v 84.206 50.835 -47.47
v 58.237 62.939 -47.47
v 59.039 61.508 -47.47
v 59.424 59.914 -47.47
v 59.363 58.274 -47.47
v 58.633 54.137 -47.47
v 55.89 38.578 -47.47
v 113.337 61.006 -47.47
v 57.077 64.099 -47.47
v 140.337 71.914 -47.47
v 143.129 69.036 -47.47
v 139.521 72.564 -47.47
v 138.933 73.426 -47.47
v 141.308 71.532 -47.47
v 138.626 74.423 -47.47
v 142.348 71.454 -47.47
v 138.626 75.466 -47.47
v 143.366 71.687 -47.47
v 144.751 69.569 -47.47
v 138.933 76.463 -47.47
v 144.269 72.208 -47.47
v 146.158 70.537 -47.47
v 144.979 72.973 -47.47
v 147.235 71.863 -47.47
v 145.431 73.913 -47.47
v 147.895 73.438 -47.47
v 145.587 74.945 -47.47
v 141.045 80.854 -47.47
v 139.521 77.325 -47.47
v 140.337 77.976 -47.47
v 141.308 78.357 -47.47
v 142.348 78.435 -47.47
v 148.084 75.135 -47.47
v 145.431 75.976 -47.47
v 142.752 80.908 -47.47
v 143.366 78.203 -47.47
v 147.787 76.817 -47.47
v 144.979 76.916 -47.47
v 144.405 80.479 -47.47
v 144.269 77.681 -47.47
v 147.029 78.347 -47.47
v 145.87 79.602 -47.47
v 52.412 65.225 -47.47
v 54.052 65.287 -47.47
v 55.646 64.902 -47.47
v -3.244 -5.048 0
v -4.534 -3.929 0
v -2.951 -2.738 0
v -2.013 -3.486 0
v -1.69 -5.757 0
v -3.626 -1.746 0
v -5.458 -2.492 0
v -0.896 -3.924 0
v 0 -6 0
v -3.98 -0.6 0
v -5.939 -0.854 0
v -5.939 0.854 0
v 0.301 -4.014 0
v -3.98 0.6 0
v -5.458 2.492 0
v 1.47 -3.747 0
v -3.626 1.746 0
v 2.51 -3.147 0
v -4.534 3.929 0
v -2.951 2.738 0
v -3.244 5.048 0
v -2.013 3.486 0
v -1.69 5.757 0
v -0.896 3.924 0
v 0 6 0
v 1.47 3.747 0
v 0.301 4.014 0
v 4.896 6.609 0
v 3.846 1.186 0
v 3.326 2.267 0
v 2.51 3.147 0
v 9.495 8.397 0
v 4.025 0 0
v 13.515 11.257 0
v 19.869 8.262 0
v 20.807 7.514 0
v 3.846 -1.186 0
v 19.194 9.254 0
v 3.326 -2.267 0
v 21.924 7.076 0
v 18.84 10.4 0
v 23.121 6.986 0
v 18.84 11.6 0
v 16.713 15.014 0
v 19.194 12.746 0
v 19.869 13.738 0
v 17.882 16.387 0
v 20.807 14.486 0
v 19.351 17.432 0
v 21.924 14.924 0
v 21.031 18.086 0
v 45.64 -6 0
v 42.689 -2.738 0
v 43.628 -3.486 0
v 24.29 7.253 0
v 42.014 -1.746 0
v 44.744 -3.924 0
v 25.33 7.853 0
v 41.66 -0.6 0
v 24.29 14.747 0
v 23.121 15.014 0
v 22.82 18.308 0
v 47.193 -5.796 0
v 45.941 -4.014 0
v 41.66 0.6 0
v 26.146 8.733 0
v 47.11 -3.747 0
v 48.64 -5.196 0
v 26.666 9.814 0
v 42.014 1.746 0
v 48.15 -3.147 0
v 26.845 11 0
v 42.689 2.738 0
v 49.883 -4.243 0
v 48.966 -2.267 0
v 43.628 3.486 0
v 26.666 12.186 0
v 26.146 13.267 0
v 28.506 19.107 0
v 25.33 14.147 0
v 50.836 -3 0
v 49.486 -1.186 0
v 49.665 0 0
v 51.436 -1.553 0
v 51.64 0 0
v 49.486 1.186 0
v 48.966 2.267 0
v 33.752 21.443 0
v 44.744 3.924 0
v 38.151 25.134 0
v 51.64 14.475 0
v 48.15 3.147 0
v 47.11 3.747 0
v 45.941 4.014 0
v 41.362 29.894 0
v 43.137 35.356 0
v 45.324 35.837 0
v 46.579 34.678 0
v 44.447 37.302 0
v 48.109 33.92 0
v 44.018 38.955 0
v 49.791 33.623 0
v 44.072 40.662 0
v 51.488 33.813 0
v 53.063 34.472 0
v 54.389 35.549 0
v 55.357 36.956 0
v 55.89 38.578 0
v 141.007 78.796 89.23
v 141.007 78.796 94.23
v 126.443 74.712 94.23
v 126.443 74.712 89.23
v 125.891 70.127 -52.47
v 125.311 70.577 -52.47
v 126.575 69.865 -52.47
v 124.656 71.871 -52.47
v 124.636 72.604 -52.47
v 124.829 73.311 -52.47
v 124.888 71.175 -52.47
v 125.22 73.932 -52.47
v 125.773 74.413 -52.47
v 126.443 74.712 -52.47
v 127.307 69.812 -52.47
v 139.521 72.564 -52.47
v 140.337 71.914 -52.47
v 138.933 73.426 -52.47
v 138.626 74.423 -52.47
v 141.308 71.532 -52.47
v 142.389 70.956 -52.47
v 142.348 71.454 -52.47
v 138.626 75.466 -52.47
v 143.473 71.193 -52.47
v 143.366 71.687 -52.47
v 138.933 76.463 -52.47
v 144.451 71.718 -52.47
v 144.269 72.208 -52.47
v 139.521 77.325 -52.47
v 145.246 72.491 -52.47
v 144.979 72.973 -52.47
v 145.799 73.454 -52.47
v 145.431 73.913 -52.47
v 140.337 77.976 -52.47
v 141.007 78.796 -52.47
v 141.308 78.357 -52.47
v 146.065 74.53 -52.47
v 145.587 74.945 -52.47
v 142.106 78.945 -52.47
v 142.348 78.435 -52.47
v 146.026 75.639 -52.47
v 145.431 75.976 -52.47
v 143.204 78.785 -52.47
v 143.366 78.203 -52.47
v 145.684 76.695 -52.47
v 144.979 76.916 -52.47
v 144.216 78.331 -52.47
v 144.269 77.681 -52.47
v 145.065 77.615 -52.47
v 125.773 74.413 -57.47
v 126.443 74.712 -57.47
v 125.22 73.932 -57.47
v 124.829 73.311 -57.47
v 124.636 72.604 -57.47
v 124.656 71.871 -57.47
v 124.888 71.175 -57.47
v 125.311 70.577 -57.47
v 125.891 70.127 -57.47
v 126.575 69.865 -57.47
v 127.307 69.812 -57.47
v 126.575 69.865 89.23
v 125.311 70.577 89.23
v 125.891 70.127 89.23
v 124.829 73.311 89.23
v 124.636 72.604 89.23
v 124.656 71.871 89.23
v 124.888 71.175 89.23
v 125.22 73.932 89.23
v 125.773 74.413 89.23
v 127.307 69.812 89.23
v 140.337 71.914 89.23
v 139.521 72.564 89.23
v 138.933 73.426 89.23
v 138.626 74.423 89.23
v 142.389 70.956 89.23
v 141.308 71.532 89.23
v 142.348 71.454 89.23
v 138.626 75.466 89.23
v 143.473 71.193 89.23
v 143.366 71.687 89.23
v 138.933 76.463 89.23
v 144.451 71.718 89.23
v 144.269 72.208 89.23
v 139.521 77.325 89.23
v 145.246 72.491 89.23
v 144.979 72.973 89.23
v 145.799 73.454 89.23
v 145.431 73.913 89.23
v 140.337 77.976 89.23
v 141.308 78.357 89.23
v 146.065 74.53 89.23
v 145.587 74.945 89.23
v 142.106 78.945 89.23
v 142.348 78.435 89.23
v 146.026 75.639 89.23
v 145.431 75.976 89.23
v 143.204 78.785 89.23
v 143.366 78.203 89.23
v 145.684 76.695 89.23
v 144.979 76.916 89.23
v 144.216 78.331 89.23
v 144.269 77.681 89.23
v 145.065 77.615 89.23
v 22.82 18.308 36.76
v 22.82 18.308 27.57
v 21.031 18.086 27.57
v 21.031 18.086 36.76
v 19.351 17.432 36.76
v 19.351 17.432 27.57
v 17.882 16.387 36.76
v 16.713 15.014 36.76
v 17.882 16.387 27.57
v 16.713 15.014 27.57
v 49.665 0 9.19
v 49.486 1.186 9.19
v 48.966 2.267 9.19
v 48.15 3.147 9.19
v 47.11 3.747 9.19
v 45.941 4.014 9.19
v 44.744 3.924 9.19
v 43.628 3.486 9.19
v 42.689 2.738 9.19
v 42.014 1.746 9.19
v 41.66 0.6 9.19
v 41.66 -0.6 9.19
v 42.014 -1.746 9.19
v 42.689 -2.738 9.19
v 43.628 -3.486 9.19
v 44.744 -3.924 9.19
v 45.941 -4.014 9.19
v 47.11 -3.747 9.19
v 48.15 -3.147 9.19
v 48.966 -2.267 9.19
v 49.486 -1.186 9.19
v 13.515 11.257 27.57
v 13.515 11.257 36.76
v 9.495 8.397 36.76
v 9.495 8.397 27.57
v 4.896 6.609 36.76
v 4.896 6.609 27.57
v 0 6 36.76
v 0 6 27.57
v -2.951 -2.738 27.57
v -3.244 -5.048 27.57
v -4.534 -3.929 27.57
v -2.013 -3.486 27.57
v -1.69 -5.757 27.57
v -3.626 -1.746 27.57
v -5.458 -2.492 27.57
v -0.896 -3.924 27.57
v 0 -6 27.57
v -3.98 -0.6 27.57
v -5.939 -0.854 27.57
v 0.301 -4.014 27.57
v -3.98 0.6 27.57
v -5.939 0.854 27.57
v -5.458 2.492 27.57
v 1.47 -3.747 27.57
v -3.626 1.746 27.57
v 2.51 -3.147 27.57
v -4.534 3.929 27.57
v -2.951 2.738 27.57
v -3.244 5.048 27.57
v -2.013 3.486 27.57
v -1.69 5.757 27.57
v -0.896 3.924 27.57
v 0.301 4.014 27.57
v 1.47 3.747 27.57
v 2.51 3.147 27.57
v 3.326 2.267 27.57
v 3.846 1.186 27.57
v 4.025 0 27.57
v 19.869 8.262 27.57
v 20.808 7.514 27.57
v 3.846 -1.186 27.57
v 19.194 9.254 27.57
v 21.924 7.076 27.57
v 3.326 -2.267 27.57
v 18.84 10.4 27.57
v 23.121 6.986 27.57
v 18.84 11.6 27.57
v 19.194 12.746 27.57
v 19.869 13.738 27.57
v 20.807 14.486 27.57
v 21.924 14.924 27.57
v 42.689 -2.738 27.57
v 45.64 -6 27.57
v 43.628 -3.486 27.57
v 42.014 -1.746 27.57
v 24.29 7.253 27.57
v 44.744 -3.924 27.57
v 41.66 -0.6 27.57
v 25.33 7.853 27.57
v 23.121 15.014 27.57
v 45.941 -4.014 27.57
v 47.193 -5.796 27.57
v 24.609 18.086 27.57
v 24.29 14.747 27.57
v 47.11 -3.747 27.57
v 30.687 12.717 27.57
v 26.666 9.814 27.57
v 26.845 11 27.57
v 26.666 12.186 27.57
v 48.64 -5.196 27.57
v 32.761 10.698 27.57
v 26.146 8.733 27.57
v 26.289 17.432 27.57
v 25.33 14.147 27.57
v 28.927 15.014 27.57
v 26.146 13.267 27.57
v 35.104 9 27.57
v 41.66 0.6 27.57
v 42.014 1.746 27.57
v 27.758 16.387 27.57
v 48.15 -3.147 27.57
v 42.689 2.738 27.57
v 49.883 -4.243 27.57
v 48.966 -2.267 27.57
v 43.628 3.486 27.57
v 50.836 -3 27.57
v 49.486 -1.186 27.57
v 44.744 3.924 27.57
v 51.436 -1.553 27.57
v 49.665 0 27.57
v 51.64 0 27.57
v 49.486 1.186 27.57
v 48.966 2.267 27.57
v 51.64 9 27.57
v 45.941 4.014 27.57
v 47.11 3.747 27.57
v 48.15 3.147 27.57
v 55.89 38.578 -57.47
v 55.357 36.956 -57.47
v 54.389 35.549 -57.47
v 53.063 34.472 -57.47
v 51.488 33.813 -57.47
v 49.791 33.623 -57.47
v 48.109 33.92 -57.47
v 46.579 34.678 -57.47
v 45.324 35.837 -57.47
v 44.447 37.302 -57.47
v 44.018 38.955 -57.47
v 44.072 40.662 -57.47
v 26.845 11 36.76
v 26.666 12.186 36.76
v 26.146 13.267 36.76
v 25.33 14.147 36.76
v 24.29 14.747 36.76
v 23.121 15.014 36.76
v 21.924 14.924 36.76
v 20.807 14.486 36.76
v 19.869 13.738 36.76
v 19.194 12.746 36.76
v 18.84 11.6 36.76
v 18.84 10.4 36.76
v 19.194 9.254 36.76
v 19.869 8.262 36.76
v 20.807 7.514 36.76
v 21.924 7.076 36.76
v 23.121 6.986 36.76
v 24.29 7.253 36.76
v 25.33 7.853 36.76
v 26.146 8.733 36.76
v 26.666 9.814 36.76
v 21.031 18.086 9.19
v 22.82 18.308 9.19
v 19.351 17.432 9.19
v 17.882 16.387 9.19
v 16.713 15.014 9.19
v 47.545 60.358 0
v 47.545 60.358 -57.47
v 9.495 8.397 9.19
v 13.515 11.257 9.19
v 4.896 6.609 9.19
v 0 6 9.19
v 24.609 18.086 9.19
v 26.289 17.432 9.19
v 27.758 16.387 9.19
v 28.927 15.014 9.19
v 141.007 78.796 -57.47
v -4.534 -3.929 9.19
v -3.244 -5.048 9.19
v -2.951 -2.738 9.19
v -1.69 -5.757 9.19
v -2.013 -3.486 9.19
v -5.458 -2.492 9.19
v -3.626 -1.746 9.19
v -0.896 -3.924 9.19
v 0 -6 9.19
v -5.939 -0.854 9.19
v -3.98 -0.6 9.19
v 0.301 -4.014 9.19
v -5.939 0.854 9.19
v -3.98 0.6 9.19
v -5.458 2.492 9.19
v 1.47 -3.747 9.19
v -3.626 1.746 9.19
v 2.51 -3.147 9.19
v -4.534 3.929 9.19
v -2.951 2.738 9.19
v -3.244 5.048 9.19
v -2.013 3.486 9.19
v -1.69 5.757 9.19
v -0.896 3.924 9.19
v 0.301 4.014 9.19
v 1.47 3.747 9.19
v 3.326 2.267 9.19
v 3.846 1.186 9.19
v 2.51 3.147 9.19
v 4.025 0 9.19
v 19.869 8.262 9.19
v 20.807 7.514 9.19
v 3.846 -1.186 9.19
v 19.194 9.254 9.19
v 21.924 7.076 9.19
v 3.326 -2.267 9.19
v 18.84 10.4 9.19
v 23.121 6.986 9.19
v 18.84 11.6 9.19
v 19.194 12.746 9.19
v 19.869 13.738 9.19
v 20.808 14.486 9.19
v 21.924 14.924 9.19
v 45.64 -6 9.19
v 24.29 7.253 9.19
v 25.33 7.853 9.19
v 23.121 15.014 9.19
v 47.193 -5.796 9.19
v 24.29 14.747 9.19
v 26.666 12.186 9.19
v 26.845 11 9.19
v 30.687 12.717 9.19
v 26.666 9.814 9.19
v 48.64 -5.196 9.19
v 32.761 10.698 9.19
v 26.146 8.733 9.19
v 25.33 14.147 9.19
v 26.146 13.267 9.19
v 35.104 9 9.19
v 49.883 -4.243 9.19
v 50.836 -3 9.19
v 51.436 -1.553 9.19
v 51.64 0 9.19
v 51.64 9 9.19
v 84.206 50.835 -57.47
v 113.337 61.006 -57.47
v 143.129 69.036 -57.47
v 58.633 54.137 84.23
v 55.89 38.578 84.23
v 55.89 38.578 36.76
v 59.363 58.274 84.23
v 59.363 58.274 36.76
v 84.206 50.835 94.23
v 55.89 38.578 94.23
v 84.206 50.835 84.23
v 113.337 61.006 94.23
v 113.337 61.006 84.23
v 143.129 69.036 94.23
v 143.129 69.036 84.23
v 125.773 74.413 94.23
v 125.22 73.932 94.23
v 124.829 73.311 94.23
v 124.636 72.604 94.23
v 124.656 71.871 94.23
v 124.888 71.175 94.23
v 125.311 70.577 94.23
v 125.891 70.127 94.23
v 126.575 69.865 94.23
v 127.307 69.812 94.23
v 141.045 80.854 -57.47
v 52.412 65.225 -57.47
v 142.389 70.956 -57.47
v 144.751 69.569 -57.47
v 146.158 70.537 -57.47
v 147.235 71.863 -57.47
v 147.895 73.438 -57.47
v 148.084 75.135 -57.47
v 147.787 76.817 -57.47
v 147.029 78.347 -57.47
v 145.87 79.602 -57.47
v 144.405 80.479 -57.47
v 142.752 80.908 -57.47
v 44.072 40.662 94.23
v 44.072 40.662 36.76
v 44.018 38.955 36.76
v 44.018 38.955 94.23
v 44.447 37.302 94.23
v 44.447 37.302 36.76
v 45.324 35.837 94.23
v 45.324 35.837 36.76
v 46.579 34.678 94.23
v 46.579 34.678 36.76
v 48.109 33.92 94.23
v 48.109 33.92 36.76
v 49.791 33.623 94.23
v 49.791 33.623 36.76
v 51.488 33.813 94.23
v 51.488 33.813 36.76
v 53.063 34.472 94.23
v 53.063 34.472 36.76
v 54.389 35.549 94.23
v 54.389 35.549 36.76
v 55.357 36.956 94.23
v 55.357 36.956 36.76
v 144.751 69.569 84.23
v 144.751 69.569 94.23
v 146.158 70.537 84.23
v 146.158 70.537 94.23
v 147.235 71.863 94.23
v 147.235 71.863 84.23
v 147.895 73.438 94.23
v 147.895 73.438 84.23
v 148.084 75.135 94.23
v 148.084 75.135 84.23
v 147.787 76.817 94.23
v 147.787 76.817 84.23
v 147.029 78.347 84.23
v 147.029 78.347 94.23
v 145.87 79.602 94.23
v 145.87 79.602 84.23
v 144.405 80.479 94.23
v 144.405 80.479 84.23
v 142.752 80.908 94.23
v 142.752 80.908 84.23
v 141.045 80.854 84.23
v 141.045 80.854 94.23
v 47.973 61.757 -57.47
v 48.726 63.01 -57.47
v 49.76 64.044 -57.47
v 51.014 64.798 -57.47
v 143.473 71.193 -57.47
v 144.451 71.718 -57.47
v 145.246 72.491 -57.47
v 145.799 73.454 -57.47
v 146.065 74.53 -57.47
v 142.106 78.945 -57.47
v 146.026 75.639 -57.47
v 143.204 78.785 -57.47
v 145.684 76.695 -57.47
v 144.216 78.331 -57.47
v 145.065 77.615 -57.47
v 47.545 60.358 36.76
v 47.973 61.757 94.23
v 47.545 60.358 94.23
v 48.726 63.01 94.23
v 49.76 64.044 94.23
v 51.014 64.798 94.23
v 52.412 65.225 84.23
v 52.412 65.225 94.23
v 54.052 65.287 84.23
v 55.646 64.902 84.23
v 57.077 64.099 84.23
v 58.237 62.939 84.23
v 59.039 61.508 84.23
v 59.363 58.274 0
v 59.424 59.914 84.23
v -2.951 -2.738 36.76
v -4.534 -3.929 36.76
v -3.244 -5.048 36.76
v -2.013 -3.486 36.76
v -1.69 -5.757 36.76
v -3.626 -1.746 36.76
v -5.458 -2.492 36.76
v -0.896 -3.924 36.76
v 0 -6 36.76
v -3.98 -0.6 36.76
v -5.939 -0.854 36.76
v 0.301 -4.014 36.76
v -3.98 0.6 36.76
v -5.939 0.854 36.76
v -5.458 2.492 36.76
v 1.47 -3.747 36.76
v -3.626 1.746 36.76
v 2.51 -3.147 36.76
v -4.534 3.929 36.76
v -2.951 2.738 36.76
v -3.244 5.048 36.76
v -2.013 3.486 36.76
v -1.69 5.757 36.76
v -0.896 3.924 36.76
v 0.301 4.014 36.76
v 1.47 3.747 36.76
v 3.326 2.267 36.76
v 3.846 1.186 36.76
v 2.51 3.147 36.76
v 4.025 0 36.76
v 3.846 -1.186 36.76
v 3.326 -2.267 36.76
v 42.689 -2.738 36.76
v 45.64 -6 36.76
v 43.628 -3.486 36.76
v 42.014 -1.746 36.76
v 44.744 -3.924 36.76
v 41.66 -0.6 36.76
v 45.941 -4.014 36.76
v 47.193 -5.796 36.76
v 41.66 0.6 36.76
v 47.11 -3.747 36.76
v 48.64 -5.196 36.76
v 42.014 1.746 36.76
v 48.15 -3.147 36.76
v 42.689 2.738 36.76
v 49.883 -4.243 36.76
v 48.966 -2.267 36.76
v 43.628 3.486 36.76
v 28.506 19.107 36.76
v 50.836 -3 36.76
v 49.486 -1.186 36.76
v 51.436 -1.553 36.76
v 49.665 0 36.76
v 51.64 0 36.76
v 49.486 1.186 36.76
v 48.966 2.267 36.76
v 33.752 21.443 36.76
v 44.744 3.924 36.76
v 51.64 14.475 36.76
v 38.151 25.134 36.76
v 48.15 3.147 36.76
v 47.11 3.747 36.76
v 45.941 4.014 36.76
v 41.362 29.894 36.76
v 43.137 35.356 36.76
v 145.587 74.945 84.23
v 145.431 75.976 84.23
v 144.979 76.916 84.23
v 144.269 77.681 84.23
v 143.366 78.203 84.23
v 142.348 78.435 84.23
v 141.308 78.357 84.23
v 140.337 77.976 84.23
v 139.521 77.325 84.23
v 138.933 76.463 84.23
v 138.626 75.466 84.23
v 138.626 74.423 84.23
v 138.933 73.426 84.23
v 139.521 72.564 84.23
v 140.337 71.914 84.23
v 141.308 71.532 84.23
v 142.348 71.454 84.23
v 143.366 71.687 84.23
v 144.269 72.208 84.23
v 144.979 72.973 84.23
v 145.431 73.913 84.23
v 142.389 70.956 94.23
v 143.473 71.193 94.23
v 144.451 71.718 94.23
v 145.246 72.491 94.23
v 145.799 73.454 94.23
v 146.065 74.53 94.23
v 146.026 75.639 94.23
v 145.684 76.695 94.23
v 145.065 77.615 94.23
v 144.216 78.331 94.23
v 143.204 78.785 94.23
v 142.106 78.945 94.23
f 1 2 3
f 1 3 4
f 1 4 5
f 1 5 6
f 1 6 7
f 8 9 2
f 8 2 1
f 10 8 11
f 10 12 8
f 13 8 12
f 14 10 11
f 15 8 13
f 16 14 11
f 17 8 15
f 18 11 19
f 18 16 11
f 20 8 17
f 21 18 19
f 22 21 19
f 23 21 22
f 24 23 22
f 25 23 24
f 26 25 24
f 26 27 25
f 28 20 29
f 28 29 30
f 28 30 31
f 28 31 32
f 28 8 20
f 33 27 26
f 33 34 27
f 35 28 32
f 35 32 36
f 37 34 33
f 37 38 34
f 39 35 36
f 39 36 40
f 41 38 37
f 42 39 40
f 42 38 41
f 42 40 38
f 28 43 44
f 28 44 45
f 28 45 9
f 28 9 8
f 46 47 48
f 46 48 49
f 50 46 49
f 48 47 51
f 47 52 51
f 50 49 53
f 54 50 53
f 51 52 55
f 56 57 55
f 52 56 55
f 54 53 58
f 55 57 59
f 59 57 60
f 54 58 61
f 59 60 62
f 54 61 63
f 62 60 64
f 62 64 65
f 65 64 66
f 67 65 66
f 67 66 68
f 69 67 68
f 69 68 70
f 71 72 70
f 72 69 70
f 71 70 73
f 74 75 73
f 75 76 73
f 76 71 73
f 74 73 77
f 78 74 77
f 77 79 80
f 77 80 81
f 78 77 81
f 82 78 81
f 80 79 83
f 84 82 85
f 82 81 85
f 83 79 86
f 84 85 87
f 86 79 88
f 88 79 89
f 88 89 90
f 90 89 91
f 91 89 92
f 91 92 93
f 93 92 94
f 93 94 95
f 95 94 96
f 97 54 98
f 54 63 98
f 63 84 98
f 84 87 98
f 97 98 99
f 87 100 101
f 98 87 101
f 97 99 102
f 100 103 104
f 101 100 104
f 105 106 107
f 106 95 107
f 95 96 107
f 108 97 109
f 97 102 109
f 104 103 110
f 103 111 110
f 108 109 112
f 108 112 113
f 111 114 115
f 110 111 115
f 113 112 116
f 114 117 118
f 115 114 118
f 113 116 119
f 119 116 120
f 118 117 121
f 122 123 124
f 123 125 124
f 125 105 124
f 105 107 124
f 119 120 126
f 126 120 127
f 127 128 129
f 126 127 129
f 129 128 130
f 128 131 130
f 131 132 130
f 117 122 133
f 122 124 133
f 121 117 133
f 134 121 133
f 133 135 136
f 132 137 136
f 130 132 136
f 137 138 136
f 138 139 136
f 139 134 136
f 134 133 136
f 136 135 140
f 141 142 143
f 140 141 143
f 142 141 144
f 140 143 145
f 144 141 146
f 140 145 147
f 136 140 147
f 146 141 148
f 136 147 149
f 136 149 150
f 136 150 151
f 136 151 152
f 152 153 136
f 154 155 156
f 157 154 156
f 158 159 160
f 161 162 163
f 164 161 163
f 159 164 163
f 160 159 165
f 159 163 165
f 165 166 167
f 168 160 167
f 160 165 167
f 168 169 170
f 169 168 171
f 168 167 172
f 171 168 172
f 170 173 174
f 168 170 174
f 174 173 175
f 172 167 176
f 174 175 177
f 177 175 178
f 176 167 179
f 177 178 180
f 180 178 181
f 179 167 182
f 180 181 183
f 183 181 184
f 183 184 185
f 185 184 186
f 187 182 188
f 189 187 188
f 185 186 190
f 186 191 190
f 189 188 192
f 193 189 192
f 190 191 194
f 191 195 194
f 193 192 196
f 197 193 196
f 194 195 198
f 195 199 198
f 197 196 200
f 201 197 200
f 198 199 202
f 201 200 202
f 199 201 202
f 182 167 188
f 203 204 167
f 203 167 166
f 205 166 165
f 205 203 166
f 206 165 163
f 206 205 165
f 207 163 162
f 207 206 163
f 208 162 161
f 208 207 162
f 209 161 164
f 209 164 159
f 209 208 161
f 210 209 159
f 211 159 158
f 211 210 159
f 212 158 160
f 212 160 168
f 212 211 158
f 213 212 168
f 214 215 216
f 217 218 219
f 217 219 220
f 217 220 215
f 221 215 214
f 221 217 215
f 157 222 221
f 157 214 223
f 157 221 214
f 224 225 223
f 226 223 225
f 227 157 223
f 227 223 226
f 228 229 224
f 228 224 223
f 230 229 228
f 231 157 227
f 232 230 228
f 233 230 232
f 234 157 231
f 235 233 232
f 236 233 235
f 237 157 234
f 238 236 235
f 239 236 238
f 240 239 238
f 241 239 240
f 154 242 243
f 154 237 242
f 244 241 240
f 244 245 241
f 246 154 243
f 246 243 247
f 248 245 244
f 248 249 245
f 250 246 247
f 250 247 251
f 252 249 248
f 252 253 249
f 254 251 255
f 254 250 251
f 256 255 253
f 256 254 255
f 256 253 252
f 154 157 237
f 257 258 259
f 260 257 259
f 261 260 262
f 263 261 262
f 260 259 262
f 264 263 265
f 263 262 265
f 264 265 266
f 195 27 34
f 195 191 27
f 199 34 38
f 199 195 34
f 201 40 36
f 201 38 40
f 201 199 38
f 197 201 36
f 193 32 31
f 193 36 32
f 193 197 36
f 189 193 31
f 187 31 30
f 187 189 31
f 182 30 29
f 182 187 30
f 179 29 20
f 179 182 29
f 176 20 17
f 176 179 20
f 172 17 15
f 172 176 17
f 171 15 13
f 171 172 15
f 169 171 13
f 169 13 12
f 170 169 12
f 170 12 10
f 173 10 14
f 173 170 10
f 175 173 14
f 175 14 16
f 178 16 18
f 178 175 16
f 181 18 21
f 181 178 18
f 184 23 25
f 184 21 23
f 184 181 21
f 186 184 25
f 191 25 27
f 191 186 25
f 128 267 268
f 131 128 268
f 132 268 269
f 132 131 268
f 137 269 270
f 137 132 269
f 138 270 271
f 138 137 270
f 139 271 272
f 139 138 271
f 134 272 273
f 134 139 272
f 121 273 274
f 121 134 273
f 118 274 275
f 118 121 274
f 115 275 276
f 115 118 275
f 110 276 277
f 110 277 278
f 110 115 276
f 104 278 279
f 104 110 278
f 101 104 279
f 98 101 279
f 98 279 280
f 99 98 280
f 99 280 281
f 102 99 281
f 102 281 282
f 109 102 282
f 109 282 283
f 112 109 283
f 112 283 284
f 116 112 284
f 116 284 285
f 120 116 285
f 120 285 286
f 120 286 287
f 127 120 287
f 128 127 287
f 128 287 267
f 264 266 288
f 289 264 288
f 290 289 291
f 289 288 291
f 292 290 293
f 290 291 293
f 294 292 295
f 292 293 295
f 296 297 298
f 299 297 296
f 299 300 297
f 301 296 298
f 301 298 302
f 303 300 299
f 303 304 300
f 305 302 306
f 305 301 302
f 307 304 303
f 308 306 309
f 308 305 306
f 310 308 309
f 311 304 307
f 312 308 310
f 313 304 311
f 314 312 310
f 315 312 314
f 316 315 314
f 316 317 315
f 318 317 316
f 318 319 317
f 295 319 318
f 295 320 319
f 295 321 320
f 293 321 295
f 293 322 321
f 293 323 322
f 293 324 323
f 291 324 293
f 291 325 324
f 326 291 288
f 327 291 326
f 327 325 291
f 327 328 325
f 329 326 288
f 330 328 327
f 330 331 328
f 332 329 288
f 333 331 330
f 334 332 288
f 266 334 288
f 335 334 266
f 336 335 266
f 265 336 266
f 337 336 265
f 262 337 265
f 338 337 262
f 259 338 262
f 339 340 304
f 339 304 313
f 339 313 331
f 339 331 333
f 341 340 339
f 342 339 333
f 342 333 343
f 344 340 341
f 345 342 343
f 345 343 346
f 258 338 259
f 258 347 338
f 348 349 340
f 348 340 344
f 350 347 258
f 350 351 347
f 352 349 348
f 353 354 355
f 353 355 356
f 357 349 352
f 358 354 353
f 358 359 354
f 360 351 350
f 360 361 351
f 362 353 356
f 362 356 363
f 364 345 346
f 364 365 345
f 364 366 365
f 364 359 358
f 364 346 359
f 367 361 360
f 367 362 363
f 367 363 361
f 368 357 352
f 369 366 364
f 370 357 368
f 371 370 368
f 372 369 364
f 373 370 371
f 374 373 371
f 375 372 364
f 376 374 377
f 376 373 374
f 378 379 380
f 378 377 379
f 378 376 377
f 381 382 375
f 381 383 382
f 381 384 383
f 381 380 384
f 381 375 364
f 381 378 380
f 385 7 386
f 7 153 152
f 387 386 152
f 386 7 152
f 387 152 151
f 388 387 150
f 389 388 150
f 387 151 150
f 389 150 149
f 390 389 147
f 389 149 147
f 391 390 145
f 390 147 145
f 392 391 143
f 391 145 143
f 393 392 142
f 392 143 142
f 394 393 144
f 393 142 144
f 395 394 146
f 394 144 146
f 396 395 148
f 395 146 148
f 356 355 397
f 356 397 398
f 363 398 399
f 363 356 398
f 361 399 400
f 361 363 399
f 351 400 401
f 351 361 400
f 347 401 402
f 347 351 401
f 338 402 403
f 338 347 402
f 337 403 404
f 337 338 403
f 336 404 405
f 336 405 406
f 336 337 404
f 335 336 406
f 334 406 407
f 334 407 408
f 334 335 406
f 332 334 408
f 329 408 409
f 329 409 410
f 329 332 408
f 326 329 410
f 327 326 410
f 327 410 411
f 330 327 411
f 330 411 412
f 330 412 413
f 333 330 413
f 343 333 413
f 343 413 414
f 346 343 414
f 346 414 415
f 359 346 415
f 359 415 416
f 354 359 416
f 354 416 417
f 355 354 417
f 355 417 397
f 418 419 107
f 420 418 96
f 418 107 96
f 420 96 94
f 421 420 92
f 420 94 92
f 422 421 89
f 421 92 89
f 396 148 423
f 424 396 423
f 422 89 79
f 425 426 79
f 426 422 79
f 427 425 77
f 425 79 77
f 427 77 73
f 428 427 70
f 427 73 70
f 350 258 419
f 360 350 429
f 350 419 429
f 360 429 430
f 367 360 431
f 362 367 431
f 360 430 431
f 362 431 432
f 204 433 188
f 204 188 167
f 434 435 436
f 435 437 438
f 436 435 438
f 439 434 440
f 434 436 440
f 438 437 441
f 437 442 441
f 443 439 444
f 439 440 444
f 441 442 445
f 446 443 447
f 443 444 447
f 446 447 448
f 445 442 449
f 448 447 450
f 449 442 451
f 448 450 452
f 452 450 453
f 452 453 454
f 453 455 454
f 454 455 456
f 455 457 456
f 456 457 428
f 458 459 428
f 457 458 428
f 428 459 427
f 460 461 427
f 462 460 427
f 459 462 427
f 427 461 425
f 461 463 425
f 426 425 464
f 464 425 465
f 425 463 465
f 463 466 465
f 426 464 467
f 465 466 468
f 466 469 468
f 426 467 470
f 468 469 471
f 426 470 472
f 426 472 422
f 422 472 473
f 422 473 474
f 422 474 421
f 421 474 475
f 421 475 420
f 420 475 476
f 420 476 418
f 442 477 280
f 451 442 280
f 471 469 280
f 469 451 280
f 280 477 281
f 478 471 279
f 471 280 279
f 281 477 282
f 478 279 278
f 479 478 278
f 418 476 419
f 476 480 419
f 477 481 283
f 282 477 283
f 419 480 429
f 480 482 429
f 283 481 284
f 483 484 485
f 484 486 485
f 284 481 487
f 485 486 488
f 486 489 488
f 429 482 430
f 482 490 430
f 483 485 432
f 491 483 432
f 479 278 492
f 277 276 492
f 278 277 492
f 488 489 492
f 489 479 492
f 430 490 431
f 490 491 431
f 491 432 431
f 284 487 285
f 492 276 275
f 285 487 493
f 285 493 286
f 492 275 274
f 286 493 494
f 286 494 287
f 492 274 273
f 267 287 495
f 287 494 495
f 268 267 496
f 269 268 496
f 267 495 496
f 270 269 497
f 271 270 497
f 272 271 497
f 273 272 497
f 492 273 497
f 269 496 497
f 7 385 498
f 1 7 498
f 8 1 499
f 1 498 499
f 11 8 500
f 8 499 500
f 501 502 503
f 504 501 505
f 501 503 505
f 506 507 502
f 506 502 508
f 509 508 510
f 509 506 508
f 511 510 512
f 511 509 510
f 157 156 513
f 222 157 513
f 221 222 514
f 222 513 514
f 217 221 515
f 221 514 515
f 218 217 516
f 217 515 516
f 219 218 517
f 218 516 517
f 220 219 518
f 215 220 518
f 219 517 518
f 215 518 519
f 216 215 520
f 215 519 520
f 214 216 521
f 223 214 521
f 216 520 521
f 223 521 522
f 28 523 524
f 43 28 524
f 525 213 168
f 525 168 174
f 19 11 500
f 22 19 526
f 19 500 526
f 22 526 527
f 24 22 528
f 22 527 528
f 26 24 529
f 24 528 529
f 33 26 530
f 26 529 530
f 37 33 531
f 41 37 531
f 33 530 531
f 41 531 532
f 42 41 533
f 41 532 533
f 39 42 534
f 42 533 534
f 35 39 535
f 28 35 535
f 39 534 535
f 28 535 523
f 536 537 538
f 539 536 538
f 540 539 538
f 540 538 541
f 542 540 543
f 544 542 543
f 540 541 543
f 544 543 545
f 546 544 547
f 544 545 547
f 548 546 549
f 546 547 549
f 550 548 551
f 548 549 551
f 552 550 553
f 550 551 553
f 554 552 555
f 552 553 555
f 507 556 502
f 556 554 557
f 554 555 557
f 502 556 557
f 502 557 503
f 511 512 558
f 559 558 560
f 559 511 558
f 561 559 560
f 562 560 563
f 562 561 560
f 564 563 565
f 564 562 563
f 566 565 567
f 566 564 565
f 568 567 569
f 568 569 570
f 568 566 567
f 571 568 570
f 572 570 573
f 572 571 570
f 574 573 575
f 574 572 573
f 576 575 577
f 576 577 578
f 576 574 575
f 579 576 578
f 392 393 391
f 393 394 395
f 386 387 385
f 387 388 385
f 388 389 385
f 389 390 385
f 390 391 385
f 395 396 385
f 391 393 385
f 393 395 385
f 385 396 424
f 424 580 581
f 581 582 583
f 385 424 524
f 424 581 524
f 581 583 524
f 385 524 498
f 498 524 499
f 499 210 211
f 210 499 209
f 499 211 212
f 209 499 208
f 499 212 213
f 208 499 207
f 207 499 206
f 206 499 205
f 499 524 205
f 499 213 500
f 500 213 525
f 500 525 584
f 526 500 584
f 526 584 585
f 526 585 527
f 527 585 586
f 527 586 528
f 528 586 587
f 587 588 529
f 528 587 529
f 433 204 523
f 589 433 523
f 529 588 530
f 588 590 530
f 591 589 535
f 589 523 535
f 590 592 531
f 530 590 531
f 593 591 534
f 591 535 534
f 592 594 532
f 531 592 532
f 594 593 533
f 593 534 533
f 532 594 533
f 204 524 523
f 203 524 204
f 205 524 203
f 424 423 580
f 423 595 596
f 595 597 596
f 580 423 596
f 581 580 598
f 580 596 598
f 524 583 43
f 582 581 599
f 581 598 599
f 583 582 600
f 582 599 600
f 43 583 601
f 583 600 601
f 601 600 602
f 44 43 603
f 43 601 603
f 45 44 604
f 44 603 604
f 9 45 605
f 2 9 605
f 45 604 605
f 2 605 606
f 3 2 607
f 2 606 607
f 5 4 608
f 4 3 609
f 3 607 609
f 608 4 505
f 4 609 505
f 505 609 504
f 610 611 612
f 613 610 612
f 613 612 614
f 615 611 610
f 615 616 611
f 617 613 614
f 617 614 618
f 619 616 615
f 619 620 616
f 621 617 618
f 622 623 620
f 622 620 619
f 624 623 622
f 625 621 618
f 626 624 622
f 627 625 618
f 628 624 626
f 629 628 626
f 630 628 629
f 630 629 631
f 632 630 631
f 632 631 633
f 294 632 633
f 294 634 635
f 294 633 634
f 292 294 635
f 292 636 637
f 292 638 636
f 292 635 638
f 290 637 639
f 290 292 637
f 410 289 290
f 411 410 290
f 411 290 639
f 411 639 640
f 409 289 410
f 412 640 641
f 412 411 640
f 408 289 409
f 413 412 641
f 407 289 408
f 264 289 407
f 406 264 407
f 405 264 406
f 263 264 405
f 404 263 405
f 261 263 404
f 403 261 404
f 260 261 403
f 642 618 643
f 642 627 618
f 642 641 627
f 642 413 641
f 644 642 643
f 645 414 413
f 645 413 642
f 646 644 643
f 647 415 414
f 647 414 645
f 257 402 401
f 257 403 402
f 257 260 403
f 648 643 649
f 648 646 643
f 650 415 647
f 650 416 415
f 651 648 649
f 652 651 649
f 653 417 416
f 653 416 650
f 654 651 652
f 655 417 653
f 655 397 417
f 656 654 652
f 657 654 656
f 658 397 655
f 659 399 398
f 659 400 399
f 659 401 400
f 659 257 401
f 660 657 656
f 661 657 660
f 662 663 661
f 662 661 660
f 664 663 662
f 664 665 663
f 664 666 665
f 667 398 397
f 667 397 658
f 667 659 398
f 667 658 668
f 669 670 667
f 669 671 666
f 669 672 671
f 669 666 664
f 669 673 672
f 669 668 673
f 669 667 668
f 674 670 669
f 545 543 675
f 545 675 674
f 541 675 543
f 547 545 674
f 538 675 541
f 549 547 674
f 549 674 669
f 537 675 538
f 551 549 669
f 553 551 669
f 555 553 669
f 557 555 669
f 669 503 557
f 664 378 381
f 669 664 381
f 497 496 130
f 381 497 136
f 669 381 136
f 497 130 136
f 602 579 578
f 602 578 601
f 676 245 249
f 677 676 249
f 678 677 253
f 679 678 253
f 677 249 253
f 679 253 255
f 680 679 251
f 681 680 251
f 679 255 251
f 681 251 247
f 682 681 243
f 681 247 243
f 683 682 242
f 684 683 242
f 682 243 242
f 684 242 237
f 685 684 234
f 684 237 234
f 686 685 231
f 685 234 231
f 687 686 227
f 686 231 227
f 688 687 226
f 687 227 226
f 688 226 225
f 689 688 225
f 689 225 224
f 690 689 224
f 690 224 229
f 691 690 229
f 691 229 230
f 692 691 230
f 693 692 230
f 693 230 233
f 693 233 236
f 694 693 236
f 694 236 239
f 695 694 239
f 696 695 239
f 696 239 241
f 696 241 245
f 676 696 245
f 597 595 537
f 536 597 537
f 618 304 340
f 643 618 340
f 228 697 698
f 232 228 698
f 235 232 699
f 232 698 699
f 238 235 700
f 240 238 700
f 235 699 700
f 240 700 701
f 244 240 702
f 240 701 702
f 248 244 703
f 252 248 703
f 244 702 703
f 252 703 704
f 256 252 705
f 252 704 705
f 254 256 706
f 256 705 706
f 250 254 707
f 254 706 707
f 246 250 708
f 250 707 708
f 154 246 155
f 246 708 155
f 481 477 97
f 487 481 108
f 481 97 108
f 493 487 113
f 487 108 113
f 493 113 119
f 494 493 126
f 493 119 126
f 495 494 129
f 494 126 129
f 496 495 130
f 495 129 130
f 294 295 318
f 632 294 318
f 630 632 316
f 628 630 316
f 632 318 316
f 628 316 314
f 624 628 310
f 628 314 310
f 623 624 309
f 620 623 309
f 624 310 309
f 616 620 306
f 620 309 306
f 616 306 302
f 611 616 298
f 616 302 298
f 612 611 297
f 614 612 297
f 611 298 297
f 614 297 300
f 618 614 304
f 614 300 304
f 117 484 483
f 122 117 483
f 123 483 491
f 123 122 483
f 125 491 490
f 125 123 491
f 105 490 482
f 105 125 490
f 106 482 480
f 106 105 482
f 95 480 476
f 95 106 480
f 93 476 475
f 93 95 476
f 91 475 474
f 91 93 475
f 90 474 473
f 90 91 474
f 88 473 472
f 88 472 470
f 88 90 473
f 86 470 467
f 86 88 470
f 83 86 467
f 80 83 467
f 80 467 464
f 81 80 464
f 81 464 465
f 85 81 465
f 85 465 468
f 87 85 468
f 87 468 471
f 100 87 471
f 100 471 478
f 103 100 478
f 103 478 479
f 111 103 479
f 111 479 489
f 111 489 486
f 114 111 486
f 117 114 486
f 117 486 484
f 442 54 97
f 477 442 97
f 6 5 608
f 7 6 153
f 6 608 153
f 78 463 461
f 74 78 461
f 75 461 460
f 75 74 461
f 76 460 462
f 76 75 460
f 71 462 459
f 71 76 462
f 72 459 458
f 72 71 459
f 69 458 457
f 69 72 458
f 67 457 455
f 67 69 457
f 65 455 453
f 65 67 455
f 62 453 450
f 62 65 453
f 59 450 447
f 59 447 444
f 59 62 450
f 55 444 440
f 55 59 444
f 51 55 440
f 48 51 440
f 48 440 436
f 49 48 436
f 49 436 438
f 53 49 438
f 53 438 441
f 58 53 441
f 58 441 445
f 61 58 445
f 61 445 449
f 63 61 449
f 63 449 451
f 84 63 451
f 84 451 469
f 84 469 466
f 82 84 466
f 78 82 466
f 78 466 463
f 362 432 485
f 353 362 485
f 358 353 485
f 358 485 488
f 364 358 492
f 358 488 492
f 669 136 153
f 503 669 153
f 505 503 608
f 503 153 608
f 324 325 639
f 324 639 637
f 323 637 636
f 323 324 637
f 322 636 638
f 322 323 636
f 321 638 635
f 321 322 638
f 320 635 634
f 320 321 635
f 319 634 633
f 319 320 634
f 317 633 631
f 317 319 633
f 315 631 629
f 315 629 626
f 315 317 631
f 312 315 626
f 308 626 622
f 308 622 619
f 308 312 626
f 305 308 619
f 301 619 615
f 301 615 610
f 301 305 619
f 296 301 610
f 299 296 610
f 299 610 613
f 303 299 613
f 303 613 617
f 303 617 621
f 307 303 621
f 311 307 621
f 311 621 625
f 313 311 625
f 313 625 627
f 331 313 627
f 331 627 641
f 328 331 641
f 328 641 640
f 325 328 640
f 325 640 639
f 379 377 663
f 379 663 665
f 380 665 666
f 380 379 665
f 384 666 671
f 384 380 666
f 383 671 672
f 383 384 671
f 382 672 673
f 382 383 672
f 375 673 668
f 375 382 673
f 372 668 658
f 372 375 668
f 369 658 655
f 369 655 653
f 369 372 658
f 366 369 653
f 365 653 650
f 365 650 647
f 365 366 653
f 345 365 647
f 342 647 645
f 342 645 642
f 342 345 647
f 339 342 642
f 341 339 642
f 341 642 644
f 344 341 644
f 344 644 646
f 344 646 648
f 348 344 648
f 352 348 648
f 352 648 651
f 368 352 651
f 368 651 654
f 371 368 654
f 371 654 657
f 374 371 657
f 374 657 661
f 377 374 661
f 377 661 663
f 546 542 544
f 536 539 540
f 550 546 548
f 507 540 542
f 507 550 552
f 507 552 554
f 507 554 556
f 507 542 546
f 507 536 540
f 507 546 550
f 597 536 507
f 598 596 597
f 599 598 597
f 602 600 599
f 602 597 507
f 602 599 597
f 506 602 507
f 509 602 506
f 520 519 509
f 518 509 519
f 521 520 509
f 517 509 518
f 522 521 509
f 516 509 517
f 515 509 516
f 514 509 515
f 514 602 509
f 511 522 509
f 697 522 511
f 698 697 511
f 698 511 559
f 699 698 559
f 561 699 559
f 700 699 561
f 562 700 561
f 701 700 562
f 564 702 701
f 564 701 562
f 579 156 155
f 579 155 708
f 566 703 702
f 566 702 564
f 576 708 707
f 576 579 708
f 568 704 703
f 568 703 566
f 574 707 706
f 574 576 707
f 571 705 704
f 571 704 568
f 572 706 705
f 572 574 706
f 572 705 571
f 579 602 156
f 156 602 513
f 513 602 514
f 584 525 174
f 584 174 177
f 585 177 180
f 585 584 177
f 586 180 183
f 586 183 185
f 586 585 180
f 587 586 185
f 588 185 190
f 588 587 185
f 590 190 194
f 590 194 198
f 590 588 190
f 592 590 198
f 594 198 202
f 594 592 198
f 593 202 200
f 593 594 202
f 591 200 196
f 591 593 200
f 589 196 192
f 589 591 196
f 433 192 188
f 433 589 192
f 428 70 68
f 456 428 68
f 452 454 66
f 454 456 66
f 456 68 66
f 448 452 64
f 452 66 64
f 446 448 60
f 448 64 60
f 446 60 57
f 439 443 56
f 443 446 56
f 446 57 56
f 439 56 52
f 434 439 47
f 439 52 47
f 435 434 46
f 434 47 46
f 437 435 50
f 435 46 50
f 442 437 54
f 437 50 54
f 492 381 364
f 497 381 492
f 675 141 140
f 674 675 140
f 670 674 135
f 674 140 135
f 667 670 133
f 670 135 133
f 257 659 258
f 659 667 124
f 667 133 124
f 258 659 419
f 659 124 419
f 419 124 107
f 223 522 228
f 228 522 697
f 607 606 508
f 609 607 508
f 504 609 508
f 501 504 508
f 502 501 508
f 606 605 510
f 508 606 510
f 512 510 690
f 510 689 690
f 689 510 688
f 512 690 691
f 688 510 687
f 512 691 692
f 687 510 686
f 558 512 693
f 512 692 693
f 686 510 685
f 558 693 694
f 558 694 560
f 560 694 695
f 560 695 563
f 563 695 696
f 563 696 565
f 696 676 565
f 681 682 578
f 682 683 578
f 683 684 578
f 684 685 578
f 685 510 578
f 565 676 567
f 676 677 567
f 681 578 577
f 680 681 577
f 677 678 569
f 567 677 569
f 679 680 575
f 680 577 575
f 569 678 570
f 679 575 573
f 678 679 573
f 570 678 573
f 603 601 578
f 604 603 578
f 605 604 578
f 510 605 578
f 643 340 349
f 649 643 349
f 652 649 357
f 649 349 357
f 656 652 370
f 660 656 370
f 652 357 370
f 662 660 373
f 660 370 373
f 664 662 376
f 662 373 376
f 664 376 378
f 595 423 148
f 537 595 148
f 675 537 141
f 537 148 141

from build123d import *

# Parameters (mm, degrees)
SKETCH1_R               = 4.025
BOSS_EXTRUDE2_DEPTH     = 36.76
RIDE_SIDE_EXTRUDE_DEPTH = 57.47
LEFT_SIDE_EXTRUDE_DEPTH = 57.47
RIGHT_ARM_EXTRUDE_DEPTH = 10
SERVO_ARM_CUT_DEPTH     = 5
SKETCH18_R              = 3.5
SERVO_HOLE_DEPTH        = 152.7
SKETCH4_R               = 4.025
CUT_EXTRUDE2_DEPTH      = 18.38
SKETCH19_W              = 18.38
SKETCH19_H              = 9
CUT_EXTRUDE3_DEPTH      = 58.64


with BuildPart() as part:
    # Sketch1 → Boss-Extrude2 (new body)
    with BuildSketch(Plane.XY):
        with BuildLine():
            ThreePointArc((16.713283102, 15.01433341), (9.494630573, 8.397245558), (0, 6))
            ThreePointArc((0, 6), (-6, 0), (0, -6))
            Line((0, -6), (45.64, -6))
            ThreePointArc((45.64, -6), (49.882640687, -4.242640687), (51.64, 0))
            Line((51.64, 0), (51.64, 14.475068019))
            Line((51.64, 14.475068019), (59.363014513, 58.27445982))
            ThreePointArc((59.363014513, 58.27445982), (54.496057061, 65.225195404), (47.545321477, 60.358237952))
            Line((47.545321477, 60.358237952), (43.136706696, 35.355741095))
            ThreePointArc((43.136706696, 35.355741095), (36.080788508, 23.1345323), (22.82, 18.308))
            ThreePointArc((22.82, 18.308), (19.350841929, 17.432091905), (16.713283102, 15.01433341))
        make_face()
        Circle(SKETCH1_R, mode=Mode.SUBTRACT)
        with Locations((45.64, 0)):
            Circle(SKETCH1_R, mode=Mode.SUBTRACT)
        with Locations((22.82, 11)):
            Circle(SKETCH1_R, mode=Mode.SUBTRACT)
    extrude(amount=BOSS_EXTRUDE2_DEPTH)

    # Sketch5 → Ride-Side-Extrude (add)
    with BuildSketch(Plane.XY.offset(36.76)):
        with BuildLine():
            Line((55.89005096, 38.578304759), (59.363014513, 58.27445982))
            ThreePointArc((59.363014513, 58.27445982), (54.496057061, 65.225195404), (47.545321477, 60.358237952))
            Line((47.545321477, 60.358237952), (44.072357924, 40.662082891))
            ThreePointArc((44.072357924, 40.662082891), (48.939315376, 33.711347307), (55.89005096, 38.578304759))
        make_face()
    extrude(amount=RIDE_SIDE_EXTRUDE_DEPTH)

    # Sketch7 → Left-Side-Extrude (add)
    with BuildSketch(Plane(origin=(0, 0, 0), x_dir=(-1, 0, 0), z_dir=(0, 0, -1))):
        with BuildLine():
            Line((-44.072357924, 40.662082891), (-47.545321477, 60.358237952))
            ThreePointArc((-47.545321477, 60.358237952), (-54.496057061, 65.225195404), (-59.363014513, 58.27445982))
            Line((-59.363014513, 58.27445982), (-55.89005096, 38.578304759))
            ThreePointArc((-55.89005096, 38.578304759), (-48.939315376, 33.711347307), (-44.072357924, 40.662082891))
        make_face()
    extrude(amount=LEFT_SIDE_EXTRUDE_DEPTH)

    # Sketch16 → Right-Arm-Extrude (add)
    with BuildSketch(Plane.XY.offset(94.23)):
        with BuildLine():
            Line((141.0449767, 80.853531394), (52.412278929, 65.225195404))
            ThreePointArc((52.412278929, 65.225195404), (57.696808682, 63.558989573), (59.363014513, 58.27445982))
            Line((59.363014513, 58.27445982), (58.633475935, 54.137040945))
            Line((58.633475935, 54.137040945), (143.128754832, 69.035838357))
            ThreePointArc((143.128754832, 69.035838357), (147.995712284, 75.986573942), (141.0449767, 80.853531394))
        make_face()
        with BuildLine():
            ThreePointArc((55.89005096, 38.578304759), (98.679190662, 56.18502639), (143.128754832, 69.035838357))
            Line((143.128754832, 69.035838357), (58.633475935, 54.137040945))
            Line((58.633475935, 54.137040945), (55.89005096, 38.578304759))
        make_face()
    right_arm_extrude = extrude(amount=-RIGHT_ARM_EXTRUDE_DEPTH)

    # Sketch17 → Servo-Arm-Cut (cut)
    with BuildSketch(Plane.XY.offset(94.23)):
        with BuildLine():
            Line((141.006923599, 78.796142381), (126.442824066, 74.712393516))
            ThreePointArc((126.442824066, 74.712393516), (124.655768538, 71.871112131), (127.306826897, 69.812389968))
            Line((127.306826897, 69.812389968), (142.389328129, 70.956136704))
            ThreePointArc((142.389328129, 70.956136704), (146.026096778, 75.639277586), (141.006923599, 78.796142381))
        make_face()
    servo_arm_cut = extrude(amount=-SERVO_ARM_CUT_DEPTH, mode=Mode.SUBTRACT)

    # Sketch18 → Servo-hole (cut, through all)
    with BuildSketch(Plane.XY.offset(94.23)):
        with Locations((142.086865766, 74.944684876)):
            Circle(SKETCH18_R)
    servo_hole = extrude(amount=-SERVO_HOLE_DEPTH, mode=Mode.SUBTRACT)

    # Sketch4 → Cut-Extrude2 (cut)
    with BuildSketch(Plane(origin=(0, 0, 9.19), x_dir=(-1, 0, 0), z_dir=(0, 0, -1))):
        with BuildLine():
            Line((-45.64, -6), (0, -6))
            ThreePointArc((0, -6), (6, 0), (0, 6))
            ThreePointArc((0, 6), (-9.494630573, 8.397245558), (-16.713283102, 15.01433341))
            ThreePointArc((-16.713283102, 15.01433341), (-22.82, 18.308), (-28.926716898, 15.01433341))
            ThreePointArc((-28.926716898, 15.01433341), (-36.145369427, 8.397245558), (-45.64, 6))
            ThreePointArc((-45.64, 6), (-51.64, 0), (-45.64, -6))
        make_face()
        with Locations((-45.64, 0)):
            Circle(SKETCH4_R, mode=Mode.SUBTRACT)
        Circle(SKETCH4_R, mode=Mode.SUBTRACT)
        with Locations((-22.82, 11)):
            Circle(SKETCH4_R, mode=Mode.SUBTRACT)
    extrude(amount=-CUT_EXTRUDE2_DEPTH, mode=Mode.SUBTRACT)

    # Sketch19 → Cut-Extrude3 (cut, through all)
    with BuildSketch(Plane(origin=(51.64, 0, 0), x_dir=(0, 0, -1), z_dir=(1, 0, 0))):
        with Locations((-18.38, 4.5)):
            Rectangle(SKETCH19_W, SKETCH19_H)
    extrude(amount=-CUT_EXTRUDE3_DEPTH, mode=Mode.SUBTRACT)

    # Left-Arm Extrude: Right-Arm-Extrude, Servo-Arm-Cut, Servo-hole across plane
    add(right_arm_extrude.mirror(Plane(origin=(0, 0, 18.38), x_dir=(1, 0, 0), z_dir=(0, 0, -1))))
    add(servo_arm_cut.mirror(Plane(origin=(0, 0, 18.38), x_dir=(1, 0, 0), z_dir=(0, 0, -1))), mode=Mode.SUBTRACT)
    add(servo_hole.mirror(Plane(origin=(0, 0, 18.38), x_dir=(1, 0, 0), z_dir=(0, 0, -1))), mode=Mode.SUBTRACT)


solid = part.part
